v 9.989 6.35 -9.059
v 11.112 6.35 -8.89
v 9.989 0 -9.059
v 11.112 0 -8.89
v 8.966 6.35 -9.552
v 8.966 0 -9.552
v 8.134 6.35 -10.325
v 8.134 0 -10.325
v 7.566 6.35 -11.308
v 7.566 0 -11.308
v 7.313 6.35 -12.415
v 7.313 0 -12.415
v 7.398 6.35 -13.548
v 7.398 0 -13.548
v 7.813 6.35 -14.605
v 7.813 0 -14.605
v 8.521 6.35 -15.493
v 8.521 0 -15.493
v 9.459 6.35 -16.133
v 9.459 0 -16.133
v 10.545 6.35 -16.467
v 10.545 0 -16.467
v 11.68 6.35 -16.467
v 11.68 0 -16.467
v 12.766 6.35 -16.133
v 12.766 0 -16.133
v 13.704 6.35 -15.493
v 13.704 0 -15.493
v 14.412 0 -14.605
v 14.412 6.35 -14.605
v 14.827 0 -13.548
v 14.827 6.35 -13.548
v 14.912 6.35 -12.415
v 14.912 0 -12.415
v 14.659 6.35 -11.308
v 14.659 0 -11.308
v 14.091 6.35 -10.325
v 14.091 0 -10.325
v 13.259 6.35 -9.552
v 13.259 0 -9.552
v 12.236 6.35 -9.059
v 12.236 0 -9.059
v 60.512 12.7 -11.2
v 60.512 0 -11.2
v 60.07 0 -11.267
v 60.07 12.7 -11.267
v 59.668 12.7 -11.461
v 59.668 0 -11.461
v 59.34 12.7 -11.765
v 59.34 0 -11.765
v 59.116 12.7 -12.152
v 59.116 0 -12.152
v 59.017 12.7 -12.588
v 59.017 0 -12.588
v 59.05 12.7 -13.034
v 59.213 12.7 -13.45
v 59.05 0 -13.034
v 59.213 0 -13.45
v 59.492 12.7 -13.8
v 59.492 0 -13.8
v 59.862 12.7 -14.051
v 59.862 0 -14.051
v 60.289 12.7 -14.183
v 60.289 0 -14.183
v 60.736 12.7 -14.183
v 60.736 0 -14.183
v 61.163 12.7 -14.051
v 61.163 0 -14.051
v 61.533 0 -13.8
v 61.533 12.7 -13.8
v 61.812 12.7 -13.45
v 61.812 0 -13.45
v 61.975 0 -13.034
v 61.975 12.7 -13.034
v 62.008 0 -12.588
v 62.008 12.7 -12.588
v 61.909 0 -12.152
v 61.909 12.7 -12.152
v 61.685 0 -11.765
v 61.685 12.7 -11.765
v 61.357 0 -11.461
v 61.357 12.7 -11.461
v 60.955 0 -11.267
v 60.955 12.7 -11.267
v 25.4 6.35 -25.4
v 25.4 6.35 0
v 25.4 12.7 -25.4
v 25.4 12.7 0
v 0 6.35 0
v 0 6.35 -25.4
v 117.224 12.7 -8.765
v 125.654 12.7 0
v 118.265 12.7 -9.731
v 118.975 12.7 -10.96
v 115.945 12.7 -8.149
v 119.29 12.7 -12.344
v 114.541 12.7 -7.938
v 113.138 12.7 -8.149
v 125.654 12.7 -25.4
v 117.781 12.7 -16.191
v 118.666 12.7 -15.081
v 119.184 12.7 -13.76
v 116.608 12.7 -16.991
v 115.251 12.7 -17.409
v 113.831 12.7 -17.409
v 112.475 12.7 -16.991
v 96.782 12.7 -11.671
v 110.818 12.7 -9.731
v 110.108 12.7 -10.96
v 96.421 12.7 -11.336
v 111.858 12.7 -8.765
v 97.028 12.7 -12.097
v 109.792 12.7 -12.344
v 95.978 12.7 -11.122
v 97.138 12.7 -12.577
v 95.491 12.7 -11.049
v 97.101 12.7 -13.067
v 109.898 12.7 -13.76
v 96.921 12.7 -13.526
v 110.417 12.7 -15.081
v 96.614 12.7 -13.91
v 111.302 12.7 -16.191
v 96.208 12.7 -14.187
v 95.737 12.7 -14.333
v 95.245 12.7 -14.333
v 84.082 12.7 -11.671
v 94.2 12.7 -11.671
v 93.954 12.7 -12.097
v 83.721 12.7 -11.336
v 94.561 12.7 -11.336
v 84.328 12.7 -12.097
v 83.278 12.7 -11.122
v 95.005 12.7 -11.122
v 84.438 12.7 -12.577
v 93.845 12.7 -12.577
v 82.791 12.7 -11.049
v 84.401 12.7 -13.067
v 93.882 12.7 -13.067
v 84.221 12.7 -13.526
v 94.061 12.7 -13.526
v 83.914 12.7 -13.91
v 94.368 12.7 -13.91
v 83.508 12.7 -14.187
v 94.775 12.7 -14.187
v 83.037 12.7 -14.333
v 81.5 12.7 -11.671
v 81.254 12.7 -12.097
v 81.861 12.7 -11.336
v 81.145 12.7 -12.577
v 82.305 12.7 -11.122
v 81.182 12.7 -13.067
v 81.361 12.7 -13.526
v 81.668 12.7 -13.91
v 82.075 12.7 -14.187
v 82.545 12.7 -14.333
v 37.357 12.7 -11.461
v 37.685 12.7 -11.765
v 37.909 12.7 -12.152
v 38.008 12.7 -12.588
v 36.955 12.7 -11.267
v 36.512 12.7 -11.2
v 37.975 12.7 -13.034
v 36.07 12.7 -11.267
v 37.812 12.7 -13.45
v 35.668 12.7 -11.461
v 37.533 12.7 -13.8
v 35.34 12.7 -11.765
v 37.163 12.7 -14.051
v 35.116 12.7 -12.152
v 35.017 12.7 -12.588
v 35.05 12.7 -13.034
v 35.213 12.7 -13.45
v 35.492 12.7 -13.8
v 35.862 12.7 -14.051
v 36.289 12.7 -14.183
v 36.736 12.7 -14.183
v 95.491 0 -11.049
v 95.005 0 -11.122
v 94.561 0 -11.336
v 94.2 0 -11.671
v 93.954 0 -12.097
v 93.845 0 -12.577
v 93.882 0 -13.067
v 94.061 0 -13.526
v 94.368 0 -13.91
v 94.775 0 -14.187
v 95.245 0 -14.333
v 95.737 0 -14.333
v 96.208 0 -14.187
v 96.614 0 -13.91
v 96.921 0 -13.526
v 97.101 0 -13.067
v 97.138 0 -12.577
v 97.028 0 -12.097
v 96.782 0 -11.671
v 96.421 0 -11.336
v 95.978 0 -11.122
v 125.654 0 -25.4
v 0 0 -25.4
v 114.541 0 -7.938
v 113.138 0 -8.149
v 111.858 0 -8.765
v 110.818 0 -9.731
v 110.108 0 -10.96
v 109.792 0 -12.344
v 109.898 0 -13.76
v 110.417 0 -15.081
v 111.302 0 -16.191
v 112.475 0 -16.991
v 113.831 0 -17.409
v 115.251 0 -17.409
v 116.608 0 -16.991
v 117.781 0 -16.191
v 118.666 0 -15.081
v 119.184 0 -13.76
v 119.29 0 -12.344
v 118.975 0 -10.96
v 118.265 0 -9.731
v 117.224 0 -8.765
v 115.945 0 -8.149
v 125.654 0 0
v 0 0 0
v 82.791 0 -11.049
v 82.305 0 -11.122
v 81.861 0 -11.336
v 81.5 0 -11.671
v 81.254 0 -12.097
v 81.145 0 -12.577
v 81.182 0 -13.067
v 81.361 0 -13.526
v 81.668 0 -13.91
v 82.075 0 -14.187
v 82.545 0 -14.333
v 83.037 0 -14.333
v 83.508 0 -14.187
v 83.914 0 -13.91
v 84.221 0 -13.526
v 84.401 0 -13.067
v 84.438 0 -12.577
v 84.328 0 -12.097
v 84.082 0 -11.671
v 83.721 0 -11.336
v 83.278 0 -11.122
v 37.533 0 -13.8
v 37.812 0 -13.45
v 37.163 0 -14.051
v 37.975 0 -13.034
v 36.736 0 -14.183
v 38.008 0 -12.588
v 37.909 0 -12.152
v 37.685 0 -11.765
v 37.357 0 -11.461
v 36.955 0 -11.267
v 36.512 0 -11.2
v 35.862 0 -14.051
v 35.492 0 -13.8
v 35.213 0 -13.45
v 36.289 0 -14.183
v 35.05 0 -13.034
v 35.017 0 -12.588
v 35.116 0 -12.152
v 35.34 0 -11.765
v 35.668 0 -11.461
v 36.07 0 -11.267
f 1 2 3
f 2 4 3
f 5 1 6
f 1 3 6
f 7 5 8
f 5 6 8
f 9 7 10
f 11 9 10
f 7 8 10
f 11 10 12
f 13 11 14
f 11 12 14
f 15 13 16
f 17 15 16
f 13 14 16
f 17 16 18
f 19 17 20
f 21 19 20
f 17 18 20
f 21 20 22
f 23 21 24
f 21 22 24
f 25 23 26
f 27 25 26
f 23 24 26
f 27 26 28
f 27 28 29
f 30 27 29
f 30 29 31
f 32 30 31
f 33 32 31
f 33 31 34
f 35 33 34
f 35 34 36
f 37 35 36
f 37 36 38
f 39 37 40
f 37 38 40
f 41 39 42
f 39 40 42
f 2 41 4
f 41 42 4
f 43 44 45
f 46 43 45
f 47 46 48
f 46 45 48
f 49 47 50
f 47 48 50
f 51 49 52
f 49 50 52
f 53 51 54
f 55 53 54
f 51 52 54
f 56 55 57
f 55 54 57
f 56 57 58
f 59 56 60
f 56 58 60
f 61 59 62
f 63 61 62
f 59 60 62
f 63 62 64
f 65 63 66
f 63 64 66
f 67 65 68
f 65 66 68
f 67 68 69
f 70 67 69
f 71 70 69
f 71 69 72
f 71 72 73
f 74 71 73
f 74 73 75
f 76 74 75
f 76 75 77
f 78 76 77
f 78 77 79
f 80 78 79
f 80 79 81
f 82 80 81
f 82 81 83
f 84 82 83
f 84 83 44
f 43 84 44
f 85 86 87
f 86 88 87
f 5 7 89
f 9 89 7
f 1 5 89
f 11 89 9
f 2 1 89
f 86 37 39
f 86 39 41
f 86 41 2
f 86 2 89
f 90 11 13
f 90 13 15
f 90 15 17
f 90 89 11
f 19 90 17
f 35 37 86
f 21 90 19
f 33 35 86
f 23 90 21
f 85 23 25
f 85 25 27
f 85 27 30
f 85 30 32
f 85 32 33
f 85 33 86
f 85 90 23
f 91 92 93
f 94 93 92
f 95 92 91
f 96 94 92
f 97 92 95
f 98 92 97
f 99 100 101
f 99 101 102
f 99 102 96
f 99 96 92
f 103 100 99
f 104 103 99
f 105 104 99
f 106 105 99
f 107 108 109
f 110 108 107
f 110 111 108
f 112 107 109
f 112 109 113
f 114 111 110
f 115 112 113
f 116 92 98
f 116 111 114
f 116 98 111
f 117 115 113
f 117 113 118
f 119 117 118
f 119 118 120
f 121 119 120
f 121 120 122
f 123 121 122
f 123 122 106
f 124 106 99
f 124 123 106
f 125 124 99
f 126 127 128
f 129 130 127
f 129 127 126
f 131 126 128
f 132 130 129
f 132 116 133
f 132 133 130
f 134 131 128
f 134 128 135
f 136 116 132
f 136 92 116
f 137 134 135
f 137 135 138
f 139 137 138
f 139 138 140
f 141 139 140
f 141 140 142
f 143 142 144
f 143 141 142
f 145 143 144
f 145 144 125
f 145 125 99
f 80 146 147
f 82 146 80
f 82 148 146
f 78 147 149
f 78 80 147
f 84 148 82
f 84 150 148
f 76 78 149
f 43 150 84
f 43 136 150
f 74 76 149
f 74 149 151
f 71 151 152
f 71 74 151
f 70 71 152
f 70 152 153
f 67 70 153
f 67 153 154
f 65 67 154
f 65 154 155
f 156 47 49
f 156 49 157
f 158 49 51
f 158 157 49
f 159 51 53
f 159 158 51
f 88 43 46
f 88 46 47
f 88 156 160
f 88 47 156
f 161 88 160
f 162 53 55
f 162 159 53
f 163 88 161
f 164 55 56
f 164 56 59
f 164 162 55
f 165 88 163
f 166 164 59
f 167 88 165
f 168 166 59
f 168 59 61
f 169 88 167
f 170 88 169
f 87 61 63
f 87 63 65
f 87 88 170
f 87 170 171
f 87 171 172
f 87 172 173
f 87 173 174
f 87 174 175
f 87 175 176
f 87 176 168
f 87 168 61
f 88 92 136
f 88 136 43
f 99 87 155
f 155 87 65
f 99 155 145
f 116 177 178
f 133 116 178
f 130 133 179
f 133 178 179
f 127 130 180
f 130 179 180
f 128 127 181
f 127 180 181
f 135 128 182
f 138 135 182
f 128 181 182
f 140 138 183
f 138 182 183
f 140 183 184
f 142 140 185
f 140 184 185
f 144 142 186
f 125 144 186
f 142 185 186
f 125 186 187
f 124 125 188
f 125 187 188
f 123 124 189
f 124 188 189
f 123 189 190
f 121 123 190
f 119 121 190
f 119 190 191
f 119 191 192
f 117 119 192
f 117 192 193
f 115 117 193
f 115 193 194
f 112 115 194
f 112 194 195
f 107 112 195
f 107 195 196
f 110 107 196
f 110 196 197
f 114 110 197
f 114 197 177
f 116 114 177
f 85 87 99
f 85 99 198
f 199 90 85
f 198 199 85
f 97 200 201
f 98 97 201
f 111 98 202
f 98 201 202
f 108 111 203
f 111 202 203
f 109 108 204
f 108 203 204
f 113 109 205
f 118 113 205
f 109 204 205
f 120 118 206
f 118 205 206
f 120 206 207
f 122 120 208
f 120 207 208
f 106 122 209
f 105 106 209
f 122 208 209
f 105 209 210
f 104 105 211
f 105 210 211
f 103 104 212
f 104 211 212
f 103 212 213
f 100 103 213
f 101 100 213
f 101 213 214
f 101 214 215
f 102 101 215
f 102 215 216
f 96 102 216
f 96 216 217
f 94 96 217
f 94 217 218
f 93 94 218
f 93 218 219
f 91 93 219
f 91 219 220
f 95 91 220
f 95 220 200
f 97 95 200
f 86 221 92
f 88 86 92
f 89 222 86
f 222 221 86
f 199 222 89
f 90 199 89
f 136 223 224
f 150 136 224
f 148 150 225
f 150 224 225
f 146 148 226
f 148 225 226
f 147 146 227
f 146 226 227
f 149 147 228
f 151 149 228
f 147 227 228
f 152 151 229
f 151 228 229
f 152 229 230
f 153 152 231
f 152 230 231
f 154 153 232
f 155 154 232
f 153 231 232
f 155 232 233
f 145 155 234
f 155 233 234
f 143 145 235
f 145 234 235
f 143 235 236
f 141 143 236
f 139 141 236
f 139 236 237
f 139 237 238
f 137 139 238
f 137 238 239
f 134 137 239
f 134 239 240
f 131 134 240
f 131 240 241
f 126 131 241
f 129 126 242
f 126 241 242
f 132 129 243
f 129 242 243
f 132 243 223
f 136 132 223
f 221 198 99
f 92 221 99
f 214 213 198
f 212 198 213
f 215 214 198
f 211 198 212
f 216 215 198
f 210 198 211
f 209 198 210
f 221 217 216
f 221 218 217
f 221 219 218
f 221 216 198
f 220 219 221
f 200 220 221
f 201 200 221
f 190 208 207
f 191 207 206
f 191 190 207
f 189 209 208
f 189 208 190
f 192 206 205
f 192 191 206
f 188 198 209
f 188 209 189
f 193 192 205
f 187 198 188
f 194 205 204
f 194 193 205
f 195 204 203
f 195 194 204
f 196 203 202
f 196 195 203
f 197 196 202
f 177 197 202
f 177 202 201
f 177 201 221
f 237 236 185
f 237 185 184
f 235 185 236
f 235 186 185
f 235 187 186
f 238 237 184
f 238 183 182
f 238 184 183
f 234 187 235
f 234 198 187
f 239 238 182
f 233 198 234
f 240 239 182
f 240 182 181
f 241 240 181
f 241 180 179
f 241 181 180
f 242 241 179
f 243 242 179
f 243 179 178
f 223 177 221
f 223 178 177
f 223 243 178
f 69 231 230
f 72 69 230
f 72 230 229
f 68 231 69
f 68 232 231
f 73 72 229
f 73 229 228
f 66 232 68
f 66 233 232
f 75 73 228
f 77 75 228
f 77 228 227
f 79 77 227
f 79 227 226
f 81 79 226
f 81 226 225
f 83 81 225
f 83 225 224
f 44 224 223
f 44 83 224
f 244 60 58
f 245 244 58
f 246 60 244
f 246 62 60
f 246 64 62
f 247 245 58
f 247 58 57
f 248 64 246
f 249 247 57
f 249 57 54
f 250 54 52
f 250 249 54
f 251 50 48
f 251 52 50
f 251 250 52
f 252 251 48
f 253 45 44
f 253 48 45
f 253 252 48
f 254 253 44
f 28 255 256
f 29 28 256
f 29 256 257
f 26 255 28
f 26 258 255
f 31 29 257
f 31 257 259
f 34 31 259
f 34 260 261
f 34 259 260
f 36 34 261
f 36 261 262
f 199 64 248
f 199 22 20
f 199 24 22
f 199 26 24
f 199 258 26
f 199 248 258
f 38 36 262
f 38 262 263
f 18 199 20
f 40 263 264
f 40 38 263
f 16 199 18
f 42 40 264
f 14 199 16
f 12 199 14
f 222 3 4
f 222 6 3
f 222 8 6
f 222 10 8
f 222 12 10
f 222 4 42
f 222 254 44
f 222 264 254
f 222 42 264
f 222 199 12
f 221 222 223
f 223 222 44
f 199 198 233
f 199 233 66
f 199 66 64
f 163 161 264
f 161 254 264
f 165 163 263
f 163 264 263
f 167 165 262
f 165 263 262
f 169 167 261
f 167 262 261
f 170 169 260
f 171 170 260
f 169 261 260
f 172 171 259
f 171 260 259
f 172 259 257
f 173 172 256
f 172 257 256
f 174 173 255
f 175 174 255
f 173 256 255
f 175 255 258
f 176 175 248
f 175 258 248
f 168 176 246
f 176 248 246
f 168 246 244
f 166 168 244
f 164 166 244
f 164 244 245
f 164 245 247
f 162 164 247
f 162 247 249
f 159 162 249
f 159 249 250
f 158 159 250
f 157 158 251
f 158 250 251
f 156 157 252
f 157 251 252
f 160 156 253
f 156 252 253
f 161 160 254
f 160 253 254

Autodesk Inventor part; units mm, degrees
ref_plane "YZ Plane" through (0, 0, 0) normal (1, 0, 0) x (0, 1, 0)
ref_plane "XZ Plane" through (0, 0, 0) normal (0, 1, 0) x (-1, 0, 0)
ref_plane "XY Plane" through (0, 0, 0) normal (0, 0, 1) x (1, 0, 0)
sketch "Sketch1" plane through (0, 0, 0) normal (1, 0, 0) x (0, 1, 0)
  line L0 (0, 0) -> (12.7, 0)
  line L1 (12.7, 0) -> (12.7, -25.4)
  line L2 (12.7, -25.4) -> (0, -25.4)
  line L3 (0, -25.4) -> (0, 0)
  dimension "d0" = 12.7
  dimension "d1" = 25.4
extrude "Extrusion1" add sketch "Sketch1" along normal blind 125.6538
sketch "Sketch3" plane through (0, 12.7, 0) normal (0, 1, 0) x (1, 0, 0)
  line L0 (0, 0) -> (125.6538, 0) projected
  line L1 (0, 25.4) -> (125.6538, 25.4) projected
  circle A0 centre (11.1125, 12.7) radius 6.35 projected
  circle A1 centre (114.5413, 12.7) radius 6.35 projected
  point P0 (36.5125, 12.7)
  point P1 (60.5125, 12.7)
  dimension "d13" = 25.4
  dimension "d14" = 12.7
  dimension "d16" = 24
  dimension "d36" = 25.4
hole "Hole1" at (36.5125, 12.7, -12.7) at (60.5125, 12.7, -12.7) direction (0, -1, 0) diameter 3 end through all
sketch "Sketch5" plane through (0, 12.7, 0) normal (0, 1, 0) x (1, 0, 0)
  line L0 (0, 0) -> (125.6538, 0) projected
  line L1 (0, 25.4) -> (125.6538, 25.4) projected
  circle A0 centre (114.5413, 12.7) radius 6.35 projected
  point P0 (95.4913, 12.7)
  dimension "d26" = 12.7
  dimension "d27" = 25.4
  dimension "d28" = 19.05
hole "Hole2" at (95.4913, 12.7, -12.7) direction (0, -1, 0) diameter 3.302 end through all thread size "8-32 UNC" class "2B" standard "ANSI Unified Screw Threads"
sketch "Sketch12" plane through (0, 12.7, 0) normal (0, 1, 0) x (1, 0, 0)
  circle A0 centre (95.4913, 12.7) radius 1.651 projected
  circle A1 centre (36.5125, 12.7) radius 1.5 projected
  circle A2 centre (60.5125, 12.7) radius 1.5 projected
  line L0 (0, 0) -> (0, 25.4) projected
  line L1 (0, 0) -> (125.6538, 0) projected
  line L2 (125.6538, 25.4) -> (125.6538, 0) projected
  line L3 (0, 25.4) -> (125.6538, 25.4) projected
  point P0 (0, 0)
  point P1 (82.7913, 12.7)
  dimension "d77" = 12.7
  dimension "d78" = 12.7
  dimension "d79" = 12.7
hole "Hole5" at (82.7913, 12.7, -12.7) direction (0, -1, 0) diameter 3.302 end through all thread size "8-32 UNC" class "2B" standard "ANSI Unified Screw Threads"
sketch "Sketch14" plane through (0, 12.7, 0) normal (0, 1, 0) x (1, 0, 0)
  circle A0 centre (82.7913, 12.7) radius 1.651 projected
  circle A1 centre (95.4913, 12.7) radius 1.651 projected
  circle A2 centre (36.5125, 12.7) radius 1.5 projected
  circle A3 centre (60.5125, 12.7) radius 1.5 projected
  line L0 (0, 0) -> (0, 25.4) projected
  line L1 (0, 0) -> (125.6538, 0) projected
  line L2 (125.6538, 25.4) -> (125.6538, 0) projected
  line L3 (0, 25.4) -> (125.6538, 25.4) projected
  point P0 (0, 0)
  point P1 (11.1125, 12.7)
hole "Hole7" at (11.1125, 12.7, -12.7) direction (0, -1, 0) diameter 7.62 end through all
sketch "Sketch15" plane through (0, 12.7, 0) normal (0, 1, 0) x (1, 0, 0)
  circle A0 centre (11.1125, 12.7) radius 3.81 projected
  circle A1 centre (82.7913, 12.7) radius 1.651 projected
  circle A2 centre (95.4913, 12.7) radius 1.651 projected
  circle A3 centre (36.5125, 12.7) radius 1.5 projected
  circle A4 centre (60.5125, 12.7) radius 1.5 projected
  line L0 (0, 0) -> (0, 25.4) projected
  line L1 (0, 0) -> (125.6538, 0) projected
  line L2 (125.6538, 25.4) -> (125.6538, 0) projected
  line L3 (0, 25.4) -> (125.6538, 25.4) projected
  circle A5 centre (114.5413, 12.7) radius 4.7625 projected
  point P0 (0, 0)
hole "Hole8" at (114.5413, 12.7, -12.7) direction (0, -1, 0) diameter 9.525 end through all
sketch "Sketch16" plane through (0, 12.7, 0) normal (0, 1, 0) x (1, 0, 0)
  circle A0 centre (114.5413, 12.7) radius 4.7625 projected
  circle A1 centre (11.1125, 12.7) radius 3.81 projected
  circle A2 centre (82.7913, 12.7) radius 1.651 projected
  circle A3 centre (95.4913, 12.7) radius 1.651 projected
  circle A4 centre (36.5125, 12.7) radius 1.5 projected
  circle A5 centre (60.5125, 12.7) radius 1.5 projected
  line L0 (0, 0) -> (0, 25.4) projected
  line L1 (0, 0) -> (125.6538, 0) projected
  line L2 (125.6538, 25.4) -> (125.6538, 0) projected
  line L3 (0, 25.4) -> (125.6538, 25.4) projected
  line L4 (0, 0) -> (125.6538, 0) projected
  line L5 (0, 0) -> (25.4, 0)
  line L6 (25.4, 0) -> (25.4, 25.4)
  line L7 (25.4, 25.4) -> (0, 25.4)
  line L8 (0, 25.4) -> (0, 0)
  dimension "d110" = 25.4
extrude "Extrusion7" cut sketch "Sketch16" against normal blind 6.35 contours L0 L3 L6 L1
equation "\"d14\" = 0.5 * d13"
equation "\"d26\" = 0.5 * d27"
equation "\"d79\" = d78"
properties part number "L17_TSI_010"
